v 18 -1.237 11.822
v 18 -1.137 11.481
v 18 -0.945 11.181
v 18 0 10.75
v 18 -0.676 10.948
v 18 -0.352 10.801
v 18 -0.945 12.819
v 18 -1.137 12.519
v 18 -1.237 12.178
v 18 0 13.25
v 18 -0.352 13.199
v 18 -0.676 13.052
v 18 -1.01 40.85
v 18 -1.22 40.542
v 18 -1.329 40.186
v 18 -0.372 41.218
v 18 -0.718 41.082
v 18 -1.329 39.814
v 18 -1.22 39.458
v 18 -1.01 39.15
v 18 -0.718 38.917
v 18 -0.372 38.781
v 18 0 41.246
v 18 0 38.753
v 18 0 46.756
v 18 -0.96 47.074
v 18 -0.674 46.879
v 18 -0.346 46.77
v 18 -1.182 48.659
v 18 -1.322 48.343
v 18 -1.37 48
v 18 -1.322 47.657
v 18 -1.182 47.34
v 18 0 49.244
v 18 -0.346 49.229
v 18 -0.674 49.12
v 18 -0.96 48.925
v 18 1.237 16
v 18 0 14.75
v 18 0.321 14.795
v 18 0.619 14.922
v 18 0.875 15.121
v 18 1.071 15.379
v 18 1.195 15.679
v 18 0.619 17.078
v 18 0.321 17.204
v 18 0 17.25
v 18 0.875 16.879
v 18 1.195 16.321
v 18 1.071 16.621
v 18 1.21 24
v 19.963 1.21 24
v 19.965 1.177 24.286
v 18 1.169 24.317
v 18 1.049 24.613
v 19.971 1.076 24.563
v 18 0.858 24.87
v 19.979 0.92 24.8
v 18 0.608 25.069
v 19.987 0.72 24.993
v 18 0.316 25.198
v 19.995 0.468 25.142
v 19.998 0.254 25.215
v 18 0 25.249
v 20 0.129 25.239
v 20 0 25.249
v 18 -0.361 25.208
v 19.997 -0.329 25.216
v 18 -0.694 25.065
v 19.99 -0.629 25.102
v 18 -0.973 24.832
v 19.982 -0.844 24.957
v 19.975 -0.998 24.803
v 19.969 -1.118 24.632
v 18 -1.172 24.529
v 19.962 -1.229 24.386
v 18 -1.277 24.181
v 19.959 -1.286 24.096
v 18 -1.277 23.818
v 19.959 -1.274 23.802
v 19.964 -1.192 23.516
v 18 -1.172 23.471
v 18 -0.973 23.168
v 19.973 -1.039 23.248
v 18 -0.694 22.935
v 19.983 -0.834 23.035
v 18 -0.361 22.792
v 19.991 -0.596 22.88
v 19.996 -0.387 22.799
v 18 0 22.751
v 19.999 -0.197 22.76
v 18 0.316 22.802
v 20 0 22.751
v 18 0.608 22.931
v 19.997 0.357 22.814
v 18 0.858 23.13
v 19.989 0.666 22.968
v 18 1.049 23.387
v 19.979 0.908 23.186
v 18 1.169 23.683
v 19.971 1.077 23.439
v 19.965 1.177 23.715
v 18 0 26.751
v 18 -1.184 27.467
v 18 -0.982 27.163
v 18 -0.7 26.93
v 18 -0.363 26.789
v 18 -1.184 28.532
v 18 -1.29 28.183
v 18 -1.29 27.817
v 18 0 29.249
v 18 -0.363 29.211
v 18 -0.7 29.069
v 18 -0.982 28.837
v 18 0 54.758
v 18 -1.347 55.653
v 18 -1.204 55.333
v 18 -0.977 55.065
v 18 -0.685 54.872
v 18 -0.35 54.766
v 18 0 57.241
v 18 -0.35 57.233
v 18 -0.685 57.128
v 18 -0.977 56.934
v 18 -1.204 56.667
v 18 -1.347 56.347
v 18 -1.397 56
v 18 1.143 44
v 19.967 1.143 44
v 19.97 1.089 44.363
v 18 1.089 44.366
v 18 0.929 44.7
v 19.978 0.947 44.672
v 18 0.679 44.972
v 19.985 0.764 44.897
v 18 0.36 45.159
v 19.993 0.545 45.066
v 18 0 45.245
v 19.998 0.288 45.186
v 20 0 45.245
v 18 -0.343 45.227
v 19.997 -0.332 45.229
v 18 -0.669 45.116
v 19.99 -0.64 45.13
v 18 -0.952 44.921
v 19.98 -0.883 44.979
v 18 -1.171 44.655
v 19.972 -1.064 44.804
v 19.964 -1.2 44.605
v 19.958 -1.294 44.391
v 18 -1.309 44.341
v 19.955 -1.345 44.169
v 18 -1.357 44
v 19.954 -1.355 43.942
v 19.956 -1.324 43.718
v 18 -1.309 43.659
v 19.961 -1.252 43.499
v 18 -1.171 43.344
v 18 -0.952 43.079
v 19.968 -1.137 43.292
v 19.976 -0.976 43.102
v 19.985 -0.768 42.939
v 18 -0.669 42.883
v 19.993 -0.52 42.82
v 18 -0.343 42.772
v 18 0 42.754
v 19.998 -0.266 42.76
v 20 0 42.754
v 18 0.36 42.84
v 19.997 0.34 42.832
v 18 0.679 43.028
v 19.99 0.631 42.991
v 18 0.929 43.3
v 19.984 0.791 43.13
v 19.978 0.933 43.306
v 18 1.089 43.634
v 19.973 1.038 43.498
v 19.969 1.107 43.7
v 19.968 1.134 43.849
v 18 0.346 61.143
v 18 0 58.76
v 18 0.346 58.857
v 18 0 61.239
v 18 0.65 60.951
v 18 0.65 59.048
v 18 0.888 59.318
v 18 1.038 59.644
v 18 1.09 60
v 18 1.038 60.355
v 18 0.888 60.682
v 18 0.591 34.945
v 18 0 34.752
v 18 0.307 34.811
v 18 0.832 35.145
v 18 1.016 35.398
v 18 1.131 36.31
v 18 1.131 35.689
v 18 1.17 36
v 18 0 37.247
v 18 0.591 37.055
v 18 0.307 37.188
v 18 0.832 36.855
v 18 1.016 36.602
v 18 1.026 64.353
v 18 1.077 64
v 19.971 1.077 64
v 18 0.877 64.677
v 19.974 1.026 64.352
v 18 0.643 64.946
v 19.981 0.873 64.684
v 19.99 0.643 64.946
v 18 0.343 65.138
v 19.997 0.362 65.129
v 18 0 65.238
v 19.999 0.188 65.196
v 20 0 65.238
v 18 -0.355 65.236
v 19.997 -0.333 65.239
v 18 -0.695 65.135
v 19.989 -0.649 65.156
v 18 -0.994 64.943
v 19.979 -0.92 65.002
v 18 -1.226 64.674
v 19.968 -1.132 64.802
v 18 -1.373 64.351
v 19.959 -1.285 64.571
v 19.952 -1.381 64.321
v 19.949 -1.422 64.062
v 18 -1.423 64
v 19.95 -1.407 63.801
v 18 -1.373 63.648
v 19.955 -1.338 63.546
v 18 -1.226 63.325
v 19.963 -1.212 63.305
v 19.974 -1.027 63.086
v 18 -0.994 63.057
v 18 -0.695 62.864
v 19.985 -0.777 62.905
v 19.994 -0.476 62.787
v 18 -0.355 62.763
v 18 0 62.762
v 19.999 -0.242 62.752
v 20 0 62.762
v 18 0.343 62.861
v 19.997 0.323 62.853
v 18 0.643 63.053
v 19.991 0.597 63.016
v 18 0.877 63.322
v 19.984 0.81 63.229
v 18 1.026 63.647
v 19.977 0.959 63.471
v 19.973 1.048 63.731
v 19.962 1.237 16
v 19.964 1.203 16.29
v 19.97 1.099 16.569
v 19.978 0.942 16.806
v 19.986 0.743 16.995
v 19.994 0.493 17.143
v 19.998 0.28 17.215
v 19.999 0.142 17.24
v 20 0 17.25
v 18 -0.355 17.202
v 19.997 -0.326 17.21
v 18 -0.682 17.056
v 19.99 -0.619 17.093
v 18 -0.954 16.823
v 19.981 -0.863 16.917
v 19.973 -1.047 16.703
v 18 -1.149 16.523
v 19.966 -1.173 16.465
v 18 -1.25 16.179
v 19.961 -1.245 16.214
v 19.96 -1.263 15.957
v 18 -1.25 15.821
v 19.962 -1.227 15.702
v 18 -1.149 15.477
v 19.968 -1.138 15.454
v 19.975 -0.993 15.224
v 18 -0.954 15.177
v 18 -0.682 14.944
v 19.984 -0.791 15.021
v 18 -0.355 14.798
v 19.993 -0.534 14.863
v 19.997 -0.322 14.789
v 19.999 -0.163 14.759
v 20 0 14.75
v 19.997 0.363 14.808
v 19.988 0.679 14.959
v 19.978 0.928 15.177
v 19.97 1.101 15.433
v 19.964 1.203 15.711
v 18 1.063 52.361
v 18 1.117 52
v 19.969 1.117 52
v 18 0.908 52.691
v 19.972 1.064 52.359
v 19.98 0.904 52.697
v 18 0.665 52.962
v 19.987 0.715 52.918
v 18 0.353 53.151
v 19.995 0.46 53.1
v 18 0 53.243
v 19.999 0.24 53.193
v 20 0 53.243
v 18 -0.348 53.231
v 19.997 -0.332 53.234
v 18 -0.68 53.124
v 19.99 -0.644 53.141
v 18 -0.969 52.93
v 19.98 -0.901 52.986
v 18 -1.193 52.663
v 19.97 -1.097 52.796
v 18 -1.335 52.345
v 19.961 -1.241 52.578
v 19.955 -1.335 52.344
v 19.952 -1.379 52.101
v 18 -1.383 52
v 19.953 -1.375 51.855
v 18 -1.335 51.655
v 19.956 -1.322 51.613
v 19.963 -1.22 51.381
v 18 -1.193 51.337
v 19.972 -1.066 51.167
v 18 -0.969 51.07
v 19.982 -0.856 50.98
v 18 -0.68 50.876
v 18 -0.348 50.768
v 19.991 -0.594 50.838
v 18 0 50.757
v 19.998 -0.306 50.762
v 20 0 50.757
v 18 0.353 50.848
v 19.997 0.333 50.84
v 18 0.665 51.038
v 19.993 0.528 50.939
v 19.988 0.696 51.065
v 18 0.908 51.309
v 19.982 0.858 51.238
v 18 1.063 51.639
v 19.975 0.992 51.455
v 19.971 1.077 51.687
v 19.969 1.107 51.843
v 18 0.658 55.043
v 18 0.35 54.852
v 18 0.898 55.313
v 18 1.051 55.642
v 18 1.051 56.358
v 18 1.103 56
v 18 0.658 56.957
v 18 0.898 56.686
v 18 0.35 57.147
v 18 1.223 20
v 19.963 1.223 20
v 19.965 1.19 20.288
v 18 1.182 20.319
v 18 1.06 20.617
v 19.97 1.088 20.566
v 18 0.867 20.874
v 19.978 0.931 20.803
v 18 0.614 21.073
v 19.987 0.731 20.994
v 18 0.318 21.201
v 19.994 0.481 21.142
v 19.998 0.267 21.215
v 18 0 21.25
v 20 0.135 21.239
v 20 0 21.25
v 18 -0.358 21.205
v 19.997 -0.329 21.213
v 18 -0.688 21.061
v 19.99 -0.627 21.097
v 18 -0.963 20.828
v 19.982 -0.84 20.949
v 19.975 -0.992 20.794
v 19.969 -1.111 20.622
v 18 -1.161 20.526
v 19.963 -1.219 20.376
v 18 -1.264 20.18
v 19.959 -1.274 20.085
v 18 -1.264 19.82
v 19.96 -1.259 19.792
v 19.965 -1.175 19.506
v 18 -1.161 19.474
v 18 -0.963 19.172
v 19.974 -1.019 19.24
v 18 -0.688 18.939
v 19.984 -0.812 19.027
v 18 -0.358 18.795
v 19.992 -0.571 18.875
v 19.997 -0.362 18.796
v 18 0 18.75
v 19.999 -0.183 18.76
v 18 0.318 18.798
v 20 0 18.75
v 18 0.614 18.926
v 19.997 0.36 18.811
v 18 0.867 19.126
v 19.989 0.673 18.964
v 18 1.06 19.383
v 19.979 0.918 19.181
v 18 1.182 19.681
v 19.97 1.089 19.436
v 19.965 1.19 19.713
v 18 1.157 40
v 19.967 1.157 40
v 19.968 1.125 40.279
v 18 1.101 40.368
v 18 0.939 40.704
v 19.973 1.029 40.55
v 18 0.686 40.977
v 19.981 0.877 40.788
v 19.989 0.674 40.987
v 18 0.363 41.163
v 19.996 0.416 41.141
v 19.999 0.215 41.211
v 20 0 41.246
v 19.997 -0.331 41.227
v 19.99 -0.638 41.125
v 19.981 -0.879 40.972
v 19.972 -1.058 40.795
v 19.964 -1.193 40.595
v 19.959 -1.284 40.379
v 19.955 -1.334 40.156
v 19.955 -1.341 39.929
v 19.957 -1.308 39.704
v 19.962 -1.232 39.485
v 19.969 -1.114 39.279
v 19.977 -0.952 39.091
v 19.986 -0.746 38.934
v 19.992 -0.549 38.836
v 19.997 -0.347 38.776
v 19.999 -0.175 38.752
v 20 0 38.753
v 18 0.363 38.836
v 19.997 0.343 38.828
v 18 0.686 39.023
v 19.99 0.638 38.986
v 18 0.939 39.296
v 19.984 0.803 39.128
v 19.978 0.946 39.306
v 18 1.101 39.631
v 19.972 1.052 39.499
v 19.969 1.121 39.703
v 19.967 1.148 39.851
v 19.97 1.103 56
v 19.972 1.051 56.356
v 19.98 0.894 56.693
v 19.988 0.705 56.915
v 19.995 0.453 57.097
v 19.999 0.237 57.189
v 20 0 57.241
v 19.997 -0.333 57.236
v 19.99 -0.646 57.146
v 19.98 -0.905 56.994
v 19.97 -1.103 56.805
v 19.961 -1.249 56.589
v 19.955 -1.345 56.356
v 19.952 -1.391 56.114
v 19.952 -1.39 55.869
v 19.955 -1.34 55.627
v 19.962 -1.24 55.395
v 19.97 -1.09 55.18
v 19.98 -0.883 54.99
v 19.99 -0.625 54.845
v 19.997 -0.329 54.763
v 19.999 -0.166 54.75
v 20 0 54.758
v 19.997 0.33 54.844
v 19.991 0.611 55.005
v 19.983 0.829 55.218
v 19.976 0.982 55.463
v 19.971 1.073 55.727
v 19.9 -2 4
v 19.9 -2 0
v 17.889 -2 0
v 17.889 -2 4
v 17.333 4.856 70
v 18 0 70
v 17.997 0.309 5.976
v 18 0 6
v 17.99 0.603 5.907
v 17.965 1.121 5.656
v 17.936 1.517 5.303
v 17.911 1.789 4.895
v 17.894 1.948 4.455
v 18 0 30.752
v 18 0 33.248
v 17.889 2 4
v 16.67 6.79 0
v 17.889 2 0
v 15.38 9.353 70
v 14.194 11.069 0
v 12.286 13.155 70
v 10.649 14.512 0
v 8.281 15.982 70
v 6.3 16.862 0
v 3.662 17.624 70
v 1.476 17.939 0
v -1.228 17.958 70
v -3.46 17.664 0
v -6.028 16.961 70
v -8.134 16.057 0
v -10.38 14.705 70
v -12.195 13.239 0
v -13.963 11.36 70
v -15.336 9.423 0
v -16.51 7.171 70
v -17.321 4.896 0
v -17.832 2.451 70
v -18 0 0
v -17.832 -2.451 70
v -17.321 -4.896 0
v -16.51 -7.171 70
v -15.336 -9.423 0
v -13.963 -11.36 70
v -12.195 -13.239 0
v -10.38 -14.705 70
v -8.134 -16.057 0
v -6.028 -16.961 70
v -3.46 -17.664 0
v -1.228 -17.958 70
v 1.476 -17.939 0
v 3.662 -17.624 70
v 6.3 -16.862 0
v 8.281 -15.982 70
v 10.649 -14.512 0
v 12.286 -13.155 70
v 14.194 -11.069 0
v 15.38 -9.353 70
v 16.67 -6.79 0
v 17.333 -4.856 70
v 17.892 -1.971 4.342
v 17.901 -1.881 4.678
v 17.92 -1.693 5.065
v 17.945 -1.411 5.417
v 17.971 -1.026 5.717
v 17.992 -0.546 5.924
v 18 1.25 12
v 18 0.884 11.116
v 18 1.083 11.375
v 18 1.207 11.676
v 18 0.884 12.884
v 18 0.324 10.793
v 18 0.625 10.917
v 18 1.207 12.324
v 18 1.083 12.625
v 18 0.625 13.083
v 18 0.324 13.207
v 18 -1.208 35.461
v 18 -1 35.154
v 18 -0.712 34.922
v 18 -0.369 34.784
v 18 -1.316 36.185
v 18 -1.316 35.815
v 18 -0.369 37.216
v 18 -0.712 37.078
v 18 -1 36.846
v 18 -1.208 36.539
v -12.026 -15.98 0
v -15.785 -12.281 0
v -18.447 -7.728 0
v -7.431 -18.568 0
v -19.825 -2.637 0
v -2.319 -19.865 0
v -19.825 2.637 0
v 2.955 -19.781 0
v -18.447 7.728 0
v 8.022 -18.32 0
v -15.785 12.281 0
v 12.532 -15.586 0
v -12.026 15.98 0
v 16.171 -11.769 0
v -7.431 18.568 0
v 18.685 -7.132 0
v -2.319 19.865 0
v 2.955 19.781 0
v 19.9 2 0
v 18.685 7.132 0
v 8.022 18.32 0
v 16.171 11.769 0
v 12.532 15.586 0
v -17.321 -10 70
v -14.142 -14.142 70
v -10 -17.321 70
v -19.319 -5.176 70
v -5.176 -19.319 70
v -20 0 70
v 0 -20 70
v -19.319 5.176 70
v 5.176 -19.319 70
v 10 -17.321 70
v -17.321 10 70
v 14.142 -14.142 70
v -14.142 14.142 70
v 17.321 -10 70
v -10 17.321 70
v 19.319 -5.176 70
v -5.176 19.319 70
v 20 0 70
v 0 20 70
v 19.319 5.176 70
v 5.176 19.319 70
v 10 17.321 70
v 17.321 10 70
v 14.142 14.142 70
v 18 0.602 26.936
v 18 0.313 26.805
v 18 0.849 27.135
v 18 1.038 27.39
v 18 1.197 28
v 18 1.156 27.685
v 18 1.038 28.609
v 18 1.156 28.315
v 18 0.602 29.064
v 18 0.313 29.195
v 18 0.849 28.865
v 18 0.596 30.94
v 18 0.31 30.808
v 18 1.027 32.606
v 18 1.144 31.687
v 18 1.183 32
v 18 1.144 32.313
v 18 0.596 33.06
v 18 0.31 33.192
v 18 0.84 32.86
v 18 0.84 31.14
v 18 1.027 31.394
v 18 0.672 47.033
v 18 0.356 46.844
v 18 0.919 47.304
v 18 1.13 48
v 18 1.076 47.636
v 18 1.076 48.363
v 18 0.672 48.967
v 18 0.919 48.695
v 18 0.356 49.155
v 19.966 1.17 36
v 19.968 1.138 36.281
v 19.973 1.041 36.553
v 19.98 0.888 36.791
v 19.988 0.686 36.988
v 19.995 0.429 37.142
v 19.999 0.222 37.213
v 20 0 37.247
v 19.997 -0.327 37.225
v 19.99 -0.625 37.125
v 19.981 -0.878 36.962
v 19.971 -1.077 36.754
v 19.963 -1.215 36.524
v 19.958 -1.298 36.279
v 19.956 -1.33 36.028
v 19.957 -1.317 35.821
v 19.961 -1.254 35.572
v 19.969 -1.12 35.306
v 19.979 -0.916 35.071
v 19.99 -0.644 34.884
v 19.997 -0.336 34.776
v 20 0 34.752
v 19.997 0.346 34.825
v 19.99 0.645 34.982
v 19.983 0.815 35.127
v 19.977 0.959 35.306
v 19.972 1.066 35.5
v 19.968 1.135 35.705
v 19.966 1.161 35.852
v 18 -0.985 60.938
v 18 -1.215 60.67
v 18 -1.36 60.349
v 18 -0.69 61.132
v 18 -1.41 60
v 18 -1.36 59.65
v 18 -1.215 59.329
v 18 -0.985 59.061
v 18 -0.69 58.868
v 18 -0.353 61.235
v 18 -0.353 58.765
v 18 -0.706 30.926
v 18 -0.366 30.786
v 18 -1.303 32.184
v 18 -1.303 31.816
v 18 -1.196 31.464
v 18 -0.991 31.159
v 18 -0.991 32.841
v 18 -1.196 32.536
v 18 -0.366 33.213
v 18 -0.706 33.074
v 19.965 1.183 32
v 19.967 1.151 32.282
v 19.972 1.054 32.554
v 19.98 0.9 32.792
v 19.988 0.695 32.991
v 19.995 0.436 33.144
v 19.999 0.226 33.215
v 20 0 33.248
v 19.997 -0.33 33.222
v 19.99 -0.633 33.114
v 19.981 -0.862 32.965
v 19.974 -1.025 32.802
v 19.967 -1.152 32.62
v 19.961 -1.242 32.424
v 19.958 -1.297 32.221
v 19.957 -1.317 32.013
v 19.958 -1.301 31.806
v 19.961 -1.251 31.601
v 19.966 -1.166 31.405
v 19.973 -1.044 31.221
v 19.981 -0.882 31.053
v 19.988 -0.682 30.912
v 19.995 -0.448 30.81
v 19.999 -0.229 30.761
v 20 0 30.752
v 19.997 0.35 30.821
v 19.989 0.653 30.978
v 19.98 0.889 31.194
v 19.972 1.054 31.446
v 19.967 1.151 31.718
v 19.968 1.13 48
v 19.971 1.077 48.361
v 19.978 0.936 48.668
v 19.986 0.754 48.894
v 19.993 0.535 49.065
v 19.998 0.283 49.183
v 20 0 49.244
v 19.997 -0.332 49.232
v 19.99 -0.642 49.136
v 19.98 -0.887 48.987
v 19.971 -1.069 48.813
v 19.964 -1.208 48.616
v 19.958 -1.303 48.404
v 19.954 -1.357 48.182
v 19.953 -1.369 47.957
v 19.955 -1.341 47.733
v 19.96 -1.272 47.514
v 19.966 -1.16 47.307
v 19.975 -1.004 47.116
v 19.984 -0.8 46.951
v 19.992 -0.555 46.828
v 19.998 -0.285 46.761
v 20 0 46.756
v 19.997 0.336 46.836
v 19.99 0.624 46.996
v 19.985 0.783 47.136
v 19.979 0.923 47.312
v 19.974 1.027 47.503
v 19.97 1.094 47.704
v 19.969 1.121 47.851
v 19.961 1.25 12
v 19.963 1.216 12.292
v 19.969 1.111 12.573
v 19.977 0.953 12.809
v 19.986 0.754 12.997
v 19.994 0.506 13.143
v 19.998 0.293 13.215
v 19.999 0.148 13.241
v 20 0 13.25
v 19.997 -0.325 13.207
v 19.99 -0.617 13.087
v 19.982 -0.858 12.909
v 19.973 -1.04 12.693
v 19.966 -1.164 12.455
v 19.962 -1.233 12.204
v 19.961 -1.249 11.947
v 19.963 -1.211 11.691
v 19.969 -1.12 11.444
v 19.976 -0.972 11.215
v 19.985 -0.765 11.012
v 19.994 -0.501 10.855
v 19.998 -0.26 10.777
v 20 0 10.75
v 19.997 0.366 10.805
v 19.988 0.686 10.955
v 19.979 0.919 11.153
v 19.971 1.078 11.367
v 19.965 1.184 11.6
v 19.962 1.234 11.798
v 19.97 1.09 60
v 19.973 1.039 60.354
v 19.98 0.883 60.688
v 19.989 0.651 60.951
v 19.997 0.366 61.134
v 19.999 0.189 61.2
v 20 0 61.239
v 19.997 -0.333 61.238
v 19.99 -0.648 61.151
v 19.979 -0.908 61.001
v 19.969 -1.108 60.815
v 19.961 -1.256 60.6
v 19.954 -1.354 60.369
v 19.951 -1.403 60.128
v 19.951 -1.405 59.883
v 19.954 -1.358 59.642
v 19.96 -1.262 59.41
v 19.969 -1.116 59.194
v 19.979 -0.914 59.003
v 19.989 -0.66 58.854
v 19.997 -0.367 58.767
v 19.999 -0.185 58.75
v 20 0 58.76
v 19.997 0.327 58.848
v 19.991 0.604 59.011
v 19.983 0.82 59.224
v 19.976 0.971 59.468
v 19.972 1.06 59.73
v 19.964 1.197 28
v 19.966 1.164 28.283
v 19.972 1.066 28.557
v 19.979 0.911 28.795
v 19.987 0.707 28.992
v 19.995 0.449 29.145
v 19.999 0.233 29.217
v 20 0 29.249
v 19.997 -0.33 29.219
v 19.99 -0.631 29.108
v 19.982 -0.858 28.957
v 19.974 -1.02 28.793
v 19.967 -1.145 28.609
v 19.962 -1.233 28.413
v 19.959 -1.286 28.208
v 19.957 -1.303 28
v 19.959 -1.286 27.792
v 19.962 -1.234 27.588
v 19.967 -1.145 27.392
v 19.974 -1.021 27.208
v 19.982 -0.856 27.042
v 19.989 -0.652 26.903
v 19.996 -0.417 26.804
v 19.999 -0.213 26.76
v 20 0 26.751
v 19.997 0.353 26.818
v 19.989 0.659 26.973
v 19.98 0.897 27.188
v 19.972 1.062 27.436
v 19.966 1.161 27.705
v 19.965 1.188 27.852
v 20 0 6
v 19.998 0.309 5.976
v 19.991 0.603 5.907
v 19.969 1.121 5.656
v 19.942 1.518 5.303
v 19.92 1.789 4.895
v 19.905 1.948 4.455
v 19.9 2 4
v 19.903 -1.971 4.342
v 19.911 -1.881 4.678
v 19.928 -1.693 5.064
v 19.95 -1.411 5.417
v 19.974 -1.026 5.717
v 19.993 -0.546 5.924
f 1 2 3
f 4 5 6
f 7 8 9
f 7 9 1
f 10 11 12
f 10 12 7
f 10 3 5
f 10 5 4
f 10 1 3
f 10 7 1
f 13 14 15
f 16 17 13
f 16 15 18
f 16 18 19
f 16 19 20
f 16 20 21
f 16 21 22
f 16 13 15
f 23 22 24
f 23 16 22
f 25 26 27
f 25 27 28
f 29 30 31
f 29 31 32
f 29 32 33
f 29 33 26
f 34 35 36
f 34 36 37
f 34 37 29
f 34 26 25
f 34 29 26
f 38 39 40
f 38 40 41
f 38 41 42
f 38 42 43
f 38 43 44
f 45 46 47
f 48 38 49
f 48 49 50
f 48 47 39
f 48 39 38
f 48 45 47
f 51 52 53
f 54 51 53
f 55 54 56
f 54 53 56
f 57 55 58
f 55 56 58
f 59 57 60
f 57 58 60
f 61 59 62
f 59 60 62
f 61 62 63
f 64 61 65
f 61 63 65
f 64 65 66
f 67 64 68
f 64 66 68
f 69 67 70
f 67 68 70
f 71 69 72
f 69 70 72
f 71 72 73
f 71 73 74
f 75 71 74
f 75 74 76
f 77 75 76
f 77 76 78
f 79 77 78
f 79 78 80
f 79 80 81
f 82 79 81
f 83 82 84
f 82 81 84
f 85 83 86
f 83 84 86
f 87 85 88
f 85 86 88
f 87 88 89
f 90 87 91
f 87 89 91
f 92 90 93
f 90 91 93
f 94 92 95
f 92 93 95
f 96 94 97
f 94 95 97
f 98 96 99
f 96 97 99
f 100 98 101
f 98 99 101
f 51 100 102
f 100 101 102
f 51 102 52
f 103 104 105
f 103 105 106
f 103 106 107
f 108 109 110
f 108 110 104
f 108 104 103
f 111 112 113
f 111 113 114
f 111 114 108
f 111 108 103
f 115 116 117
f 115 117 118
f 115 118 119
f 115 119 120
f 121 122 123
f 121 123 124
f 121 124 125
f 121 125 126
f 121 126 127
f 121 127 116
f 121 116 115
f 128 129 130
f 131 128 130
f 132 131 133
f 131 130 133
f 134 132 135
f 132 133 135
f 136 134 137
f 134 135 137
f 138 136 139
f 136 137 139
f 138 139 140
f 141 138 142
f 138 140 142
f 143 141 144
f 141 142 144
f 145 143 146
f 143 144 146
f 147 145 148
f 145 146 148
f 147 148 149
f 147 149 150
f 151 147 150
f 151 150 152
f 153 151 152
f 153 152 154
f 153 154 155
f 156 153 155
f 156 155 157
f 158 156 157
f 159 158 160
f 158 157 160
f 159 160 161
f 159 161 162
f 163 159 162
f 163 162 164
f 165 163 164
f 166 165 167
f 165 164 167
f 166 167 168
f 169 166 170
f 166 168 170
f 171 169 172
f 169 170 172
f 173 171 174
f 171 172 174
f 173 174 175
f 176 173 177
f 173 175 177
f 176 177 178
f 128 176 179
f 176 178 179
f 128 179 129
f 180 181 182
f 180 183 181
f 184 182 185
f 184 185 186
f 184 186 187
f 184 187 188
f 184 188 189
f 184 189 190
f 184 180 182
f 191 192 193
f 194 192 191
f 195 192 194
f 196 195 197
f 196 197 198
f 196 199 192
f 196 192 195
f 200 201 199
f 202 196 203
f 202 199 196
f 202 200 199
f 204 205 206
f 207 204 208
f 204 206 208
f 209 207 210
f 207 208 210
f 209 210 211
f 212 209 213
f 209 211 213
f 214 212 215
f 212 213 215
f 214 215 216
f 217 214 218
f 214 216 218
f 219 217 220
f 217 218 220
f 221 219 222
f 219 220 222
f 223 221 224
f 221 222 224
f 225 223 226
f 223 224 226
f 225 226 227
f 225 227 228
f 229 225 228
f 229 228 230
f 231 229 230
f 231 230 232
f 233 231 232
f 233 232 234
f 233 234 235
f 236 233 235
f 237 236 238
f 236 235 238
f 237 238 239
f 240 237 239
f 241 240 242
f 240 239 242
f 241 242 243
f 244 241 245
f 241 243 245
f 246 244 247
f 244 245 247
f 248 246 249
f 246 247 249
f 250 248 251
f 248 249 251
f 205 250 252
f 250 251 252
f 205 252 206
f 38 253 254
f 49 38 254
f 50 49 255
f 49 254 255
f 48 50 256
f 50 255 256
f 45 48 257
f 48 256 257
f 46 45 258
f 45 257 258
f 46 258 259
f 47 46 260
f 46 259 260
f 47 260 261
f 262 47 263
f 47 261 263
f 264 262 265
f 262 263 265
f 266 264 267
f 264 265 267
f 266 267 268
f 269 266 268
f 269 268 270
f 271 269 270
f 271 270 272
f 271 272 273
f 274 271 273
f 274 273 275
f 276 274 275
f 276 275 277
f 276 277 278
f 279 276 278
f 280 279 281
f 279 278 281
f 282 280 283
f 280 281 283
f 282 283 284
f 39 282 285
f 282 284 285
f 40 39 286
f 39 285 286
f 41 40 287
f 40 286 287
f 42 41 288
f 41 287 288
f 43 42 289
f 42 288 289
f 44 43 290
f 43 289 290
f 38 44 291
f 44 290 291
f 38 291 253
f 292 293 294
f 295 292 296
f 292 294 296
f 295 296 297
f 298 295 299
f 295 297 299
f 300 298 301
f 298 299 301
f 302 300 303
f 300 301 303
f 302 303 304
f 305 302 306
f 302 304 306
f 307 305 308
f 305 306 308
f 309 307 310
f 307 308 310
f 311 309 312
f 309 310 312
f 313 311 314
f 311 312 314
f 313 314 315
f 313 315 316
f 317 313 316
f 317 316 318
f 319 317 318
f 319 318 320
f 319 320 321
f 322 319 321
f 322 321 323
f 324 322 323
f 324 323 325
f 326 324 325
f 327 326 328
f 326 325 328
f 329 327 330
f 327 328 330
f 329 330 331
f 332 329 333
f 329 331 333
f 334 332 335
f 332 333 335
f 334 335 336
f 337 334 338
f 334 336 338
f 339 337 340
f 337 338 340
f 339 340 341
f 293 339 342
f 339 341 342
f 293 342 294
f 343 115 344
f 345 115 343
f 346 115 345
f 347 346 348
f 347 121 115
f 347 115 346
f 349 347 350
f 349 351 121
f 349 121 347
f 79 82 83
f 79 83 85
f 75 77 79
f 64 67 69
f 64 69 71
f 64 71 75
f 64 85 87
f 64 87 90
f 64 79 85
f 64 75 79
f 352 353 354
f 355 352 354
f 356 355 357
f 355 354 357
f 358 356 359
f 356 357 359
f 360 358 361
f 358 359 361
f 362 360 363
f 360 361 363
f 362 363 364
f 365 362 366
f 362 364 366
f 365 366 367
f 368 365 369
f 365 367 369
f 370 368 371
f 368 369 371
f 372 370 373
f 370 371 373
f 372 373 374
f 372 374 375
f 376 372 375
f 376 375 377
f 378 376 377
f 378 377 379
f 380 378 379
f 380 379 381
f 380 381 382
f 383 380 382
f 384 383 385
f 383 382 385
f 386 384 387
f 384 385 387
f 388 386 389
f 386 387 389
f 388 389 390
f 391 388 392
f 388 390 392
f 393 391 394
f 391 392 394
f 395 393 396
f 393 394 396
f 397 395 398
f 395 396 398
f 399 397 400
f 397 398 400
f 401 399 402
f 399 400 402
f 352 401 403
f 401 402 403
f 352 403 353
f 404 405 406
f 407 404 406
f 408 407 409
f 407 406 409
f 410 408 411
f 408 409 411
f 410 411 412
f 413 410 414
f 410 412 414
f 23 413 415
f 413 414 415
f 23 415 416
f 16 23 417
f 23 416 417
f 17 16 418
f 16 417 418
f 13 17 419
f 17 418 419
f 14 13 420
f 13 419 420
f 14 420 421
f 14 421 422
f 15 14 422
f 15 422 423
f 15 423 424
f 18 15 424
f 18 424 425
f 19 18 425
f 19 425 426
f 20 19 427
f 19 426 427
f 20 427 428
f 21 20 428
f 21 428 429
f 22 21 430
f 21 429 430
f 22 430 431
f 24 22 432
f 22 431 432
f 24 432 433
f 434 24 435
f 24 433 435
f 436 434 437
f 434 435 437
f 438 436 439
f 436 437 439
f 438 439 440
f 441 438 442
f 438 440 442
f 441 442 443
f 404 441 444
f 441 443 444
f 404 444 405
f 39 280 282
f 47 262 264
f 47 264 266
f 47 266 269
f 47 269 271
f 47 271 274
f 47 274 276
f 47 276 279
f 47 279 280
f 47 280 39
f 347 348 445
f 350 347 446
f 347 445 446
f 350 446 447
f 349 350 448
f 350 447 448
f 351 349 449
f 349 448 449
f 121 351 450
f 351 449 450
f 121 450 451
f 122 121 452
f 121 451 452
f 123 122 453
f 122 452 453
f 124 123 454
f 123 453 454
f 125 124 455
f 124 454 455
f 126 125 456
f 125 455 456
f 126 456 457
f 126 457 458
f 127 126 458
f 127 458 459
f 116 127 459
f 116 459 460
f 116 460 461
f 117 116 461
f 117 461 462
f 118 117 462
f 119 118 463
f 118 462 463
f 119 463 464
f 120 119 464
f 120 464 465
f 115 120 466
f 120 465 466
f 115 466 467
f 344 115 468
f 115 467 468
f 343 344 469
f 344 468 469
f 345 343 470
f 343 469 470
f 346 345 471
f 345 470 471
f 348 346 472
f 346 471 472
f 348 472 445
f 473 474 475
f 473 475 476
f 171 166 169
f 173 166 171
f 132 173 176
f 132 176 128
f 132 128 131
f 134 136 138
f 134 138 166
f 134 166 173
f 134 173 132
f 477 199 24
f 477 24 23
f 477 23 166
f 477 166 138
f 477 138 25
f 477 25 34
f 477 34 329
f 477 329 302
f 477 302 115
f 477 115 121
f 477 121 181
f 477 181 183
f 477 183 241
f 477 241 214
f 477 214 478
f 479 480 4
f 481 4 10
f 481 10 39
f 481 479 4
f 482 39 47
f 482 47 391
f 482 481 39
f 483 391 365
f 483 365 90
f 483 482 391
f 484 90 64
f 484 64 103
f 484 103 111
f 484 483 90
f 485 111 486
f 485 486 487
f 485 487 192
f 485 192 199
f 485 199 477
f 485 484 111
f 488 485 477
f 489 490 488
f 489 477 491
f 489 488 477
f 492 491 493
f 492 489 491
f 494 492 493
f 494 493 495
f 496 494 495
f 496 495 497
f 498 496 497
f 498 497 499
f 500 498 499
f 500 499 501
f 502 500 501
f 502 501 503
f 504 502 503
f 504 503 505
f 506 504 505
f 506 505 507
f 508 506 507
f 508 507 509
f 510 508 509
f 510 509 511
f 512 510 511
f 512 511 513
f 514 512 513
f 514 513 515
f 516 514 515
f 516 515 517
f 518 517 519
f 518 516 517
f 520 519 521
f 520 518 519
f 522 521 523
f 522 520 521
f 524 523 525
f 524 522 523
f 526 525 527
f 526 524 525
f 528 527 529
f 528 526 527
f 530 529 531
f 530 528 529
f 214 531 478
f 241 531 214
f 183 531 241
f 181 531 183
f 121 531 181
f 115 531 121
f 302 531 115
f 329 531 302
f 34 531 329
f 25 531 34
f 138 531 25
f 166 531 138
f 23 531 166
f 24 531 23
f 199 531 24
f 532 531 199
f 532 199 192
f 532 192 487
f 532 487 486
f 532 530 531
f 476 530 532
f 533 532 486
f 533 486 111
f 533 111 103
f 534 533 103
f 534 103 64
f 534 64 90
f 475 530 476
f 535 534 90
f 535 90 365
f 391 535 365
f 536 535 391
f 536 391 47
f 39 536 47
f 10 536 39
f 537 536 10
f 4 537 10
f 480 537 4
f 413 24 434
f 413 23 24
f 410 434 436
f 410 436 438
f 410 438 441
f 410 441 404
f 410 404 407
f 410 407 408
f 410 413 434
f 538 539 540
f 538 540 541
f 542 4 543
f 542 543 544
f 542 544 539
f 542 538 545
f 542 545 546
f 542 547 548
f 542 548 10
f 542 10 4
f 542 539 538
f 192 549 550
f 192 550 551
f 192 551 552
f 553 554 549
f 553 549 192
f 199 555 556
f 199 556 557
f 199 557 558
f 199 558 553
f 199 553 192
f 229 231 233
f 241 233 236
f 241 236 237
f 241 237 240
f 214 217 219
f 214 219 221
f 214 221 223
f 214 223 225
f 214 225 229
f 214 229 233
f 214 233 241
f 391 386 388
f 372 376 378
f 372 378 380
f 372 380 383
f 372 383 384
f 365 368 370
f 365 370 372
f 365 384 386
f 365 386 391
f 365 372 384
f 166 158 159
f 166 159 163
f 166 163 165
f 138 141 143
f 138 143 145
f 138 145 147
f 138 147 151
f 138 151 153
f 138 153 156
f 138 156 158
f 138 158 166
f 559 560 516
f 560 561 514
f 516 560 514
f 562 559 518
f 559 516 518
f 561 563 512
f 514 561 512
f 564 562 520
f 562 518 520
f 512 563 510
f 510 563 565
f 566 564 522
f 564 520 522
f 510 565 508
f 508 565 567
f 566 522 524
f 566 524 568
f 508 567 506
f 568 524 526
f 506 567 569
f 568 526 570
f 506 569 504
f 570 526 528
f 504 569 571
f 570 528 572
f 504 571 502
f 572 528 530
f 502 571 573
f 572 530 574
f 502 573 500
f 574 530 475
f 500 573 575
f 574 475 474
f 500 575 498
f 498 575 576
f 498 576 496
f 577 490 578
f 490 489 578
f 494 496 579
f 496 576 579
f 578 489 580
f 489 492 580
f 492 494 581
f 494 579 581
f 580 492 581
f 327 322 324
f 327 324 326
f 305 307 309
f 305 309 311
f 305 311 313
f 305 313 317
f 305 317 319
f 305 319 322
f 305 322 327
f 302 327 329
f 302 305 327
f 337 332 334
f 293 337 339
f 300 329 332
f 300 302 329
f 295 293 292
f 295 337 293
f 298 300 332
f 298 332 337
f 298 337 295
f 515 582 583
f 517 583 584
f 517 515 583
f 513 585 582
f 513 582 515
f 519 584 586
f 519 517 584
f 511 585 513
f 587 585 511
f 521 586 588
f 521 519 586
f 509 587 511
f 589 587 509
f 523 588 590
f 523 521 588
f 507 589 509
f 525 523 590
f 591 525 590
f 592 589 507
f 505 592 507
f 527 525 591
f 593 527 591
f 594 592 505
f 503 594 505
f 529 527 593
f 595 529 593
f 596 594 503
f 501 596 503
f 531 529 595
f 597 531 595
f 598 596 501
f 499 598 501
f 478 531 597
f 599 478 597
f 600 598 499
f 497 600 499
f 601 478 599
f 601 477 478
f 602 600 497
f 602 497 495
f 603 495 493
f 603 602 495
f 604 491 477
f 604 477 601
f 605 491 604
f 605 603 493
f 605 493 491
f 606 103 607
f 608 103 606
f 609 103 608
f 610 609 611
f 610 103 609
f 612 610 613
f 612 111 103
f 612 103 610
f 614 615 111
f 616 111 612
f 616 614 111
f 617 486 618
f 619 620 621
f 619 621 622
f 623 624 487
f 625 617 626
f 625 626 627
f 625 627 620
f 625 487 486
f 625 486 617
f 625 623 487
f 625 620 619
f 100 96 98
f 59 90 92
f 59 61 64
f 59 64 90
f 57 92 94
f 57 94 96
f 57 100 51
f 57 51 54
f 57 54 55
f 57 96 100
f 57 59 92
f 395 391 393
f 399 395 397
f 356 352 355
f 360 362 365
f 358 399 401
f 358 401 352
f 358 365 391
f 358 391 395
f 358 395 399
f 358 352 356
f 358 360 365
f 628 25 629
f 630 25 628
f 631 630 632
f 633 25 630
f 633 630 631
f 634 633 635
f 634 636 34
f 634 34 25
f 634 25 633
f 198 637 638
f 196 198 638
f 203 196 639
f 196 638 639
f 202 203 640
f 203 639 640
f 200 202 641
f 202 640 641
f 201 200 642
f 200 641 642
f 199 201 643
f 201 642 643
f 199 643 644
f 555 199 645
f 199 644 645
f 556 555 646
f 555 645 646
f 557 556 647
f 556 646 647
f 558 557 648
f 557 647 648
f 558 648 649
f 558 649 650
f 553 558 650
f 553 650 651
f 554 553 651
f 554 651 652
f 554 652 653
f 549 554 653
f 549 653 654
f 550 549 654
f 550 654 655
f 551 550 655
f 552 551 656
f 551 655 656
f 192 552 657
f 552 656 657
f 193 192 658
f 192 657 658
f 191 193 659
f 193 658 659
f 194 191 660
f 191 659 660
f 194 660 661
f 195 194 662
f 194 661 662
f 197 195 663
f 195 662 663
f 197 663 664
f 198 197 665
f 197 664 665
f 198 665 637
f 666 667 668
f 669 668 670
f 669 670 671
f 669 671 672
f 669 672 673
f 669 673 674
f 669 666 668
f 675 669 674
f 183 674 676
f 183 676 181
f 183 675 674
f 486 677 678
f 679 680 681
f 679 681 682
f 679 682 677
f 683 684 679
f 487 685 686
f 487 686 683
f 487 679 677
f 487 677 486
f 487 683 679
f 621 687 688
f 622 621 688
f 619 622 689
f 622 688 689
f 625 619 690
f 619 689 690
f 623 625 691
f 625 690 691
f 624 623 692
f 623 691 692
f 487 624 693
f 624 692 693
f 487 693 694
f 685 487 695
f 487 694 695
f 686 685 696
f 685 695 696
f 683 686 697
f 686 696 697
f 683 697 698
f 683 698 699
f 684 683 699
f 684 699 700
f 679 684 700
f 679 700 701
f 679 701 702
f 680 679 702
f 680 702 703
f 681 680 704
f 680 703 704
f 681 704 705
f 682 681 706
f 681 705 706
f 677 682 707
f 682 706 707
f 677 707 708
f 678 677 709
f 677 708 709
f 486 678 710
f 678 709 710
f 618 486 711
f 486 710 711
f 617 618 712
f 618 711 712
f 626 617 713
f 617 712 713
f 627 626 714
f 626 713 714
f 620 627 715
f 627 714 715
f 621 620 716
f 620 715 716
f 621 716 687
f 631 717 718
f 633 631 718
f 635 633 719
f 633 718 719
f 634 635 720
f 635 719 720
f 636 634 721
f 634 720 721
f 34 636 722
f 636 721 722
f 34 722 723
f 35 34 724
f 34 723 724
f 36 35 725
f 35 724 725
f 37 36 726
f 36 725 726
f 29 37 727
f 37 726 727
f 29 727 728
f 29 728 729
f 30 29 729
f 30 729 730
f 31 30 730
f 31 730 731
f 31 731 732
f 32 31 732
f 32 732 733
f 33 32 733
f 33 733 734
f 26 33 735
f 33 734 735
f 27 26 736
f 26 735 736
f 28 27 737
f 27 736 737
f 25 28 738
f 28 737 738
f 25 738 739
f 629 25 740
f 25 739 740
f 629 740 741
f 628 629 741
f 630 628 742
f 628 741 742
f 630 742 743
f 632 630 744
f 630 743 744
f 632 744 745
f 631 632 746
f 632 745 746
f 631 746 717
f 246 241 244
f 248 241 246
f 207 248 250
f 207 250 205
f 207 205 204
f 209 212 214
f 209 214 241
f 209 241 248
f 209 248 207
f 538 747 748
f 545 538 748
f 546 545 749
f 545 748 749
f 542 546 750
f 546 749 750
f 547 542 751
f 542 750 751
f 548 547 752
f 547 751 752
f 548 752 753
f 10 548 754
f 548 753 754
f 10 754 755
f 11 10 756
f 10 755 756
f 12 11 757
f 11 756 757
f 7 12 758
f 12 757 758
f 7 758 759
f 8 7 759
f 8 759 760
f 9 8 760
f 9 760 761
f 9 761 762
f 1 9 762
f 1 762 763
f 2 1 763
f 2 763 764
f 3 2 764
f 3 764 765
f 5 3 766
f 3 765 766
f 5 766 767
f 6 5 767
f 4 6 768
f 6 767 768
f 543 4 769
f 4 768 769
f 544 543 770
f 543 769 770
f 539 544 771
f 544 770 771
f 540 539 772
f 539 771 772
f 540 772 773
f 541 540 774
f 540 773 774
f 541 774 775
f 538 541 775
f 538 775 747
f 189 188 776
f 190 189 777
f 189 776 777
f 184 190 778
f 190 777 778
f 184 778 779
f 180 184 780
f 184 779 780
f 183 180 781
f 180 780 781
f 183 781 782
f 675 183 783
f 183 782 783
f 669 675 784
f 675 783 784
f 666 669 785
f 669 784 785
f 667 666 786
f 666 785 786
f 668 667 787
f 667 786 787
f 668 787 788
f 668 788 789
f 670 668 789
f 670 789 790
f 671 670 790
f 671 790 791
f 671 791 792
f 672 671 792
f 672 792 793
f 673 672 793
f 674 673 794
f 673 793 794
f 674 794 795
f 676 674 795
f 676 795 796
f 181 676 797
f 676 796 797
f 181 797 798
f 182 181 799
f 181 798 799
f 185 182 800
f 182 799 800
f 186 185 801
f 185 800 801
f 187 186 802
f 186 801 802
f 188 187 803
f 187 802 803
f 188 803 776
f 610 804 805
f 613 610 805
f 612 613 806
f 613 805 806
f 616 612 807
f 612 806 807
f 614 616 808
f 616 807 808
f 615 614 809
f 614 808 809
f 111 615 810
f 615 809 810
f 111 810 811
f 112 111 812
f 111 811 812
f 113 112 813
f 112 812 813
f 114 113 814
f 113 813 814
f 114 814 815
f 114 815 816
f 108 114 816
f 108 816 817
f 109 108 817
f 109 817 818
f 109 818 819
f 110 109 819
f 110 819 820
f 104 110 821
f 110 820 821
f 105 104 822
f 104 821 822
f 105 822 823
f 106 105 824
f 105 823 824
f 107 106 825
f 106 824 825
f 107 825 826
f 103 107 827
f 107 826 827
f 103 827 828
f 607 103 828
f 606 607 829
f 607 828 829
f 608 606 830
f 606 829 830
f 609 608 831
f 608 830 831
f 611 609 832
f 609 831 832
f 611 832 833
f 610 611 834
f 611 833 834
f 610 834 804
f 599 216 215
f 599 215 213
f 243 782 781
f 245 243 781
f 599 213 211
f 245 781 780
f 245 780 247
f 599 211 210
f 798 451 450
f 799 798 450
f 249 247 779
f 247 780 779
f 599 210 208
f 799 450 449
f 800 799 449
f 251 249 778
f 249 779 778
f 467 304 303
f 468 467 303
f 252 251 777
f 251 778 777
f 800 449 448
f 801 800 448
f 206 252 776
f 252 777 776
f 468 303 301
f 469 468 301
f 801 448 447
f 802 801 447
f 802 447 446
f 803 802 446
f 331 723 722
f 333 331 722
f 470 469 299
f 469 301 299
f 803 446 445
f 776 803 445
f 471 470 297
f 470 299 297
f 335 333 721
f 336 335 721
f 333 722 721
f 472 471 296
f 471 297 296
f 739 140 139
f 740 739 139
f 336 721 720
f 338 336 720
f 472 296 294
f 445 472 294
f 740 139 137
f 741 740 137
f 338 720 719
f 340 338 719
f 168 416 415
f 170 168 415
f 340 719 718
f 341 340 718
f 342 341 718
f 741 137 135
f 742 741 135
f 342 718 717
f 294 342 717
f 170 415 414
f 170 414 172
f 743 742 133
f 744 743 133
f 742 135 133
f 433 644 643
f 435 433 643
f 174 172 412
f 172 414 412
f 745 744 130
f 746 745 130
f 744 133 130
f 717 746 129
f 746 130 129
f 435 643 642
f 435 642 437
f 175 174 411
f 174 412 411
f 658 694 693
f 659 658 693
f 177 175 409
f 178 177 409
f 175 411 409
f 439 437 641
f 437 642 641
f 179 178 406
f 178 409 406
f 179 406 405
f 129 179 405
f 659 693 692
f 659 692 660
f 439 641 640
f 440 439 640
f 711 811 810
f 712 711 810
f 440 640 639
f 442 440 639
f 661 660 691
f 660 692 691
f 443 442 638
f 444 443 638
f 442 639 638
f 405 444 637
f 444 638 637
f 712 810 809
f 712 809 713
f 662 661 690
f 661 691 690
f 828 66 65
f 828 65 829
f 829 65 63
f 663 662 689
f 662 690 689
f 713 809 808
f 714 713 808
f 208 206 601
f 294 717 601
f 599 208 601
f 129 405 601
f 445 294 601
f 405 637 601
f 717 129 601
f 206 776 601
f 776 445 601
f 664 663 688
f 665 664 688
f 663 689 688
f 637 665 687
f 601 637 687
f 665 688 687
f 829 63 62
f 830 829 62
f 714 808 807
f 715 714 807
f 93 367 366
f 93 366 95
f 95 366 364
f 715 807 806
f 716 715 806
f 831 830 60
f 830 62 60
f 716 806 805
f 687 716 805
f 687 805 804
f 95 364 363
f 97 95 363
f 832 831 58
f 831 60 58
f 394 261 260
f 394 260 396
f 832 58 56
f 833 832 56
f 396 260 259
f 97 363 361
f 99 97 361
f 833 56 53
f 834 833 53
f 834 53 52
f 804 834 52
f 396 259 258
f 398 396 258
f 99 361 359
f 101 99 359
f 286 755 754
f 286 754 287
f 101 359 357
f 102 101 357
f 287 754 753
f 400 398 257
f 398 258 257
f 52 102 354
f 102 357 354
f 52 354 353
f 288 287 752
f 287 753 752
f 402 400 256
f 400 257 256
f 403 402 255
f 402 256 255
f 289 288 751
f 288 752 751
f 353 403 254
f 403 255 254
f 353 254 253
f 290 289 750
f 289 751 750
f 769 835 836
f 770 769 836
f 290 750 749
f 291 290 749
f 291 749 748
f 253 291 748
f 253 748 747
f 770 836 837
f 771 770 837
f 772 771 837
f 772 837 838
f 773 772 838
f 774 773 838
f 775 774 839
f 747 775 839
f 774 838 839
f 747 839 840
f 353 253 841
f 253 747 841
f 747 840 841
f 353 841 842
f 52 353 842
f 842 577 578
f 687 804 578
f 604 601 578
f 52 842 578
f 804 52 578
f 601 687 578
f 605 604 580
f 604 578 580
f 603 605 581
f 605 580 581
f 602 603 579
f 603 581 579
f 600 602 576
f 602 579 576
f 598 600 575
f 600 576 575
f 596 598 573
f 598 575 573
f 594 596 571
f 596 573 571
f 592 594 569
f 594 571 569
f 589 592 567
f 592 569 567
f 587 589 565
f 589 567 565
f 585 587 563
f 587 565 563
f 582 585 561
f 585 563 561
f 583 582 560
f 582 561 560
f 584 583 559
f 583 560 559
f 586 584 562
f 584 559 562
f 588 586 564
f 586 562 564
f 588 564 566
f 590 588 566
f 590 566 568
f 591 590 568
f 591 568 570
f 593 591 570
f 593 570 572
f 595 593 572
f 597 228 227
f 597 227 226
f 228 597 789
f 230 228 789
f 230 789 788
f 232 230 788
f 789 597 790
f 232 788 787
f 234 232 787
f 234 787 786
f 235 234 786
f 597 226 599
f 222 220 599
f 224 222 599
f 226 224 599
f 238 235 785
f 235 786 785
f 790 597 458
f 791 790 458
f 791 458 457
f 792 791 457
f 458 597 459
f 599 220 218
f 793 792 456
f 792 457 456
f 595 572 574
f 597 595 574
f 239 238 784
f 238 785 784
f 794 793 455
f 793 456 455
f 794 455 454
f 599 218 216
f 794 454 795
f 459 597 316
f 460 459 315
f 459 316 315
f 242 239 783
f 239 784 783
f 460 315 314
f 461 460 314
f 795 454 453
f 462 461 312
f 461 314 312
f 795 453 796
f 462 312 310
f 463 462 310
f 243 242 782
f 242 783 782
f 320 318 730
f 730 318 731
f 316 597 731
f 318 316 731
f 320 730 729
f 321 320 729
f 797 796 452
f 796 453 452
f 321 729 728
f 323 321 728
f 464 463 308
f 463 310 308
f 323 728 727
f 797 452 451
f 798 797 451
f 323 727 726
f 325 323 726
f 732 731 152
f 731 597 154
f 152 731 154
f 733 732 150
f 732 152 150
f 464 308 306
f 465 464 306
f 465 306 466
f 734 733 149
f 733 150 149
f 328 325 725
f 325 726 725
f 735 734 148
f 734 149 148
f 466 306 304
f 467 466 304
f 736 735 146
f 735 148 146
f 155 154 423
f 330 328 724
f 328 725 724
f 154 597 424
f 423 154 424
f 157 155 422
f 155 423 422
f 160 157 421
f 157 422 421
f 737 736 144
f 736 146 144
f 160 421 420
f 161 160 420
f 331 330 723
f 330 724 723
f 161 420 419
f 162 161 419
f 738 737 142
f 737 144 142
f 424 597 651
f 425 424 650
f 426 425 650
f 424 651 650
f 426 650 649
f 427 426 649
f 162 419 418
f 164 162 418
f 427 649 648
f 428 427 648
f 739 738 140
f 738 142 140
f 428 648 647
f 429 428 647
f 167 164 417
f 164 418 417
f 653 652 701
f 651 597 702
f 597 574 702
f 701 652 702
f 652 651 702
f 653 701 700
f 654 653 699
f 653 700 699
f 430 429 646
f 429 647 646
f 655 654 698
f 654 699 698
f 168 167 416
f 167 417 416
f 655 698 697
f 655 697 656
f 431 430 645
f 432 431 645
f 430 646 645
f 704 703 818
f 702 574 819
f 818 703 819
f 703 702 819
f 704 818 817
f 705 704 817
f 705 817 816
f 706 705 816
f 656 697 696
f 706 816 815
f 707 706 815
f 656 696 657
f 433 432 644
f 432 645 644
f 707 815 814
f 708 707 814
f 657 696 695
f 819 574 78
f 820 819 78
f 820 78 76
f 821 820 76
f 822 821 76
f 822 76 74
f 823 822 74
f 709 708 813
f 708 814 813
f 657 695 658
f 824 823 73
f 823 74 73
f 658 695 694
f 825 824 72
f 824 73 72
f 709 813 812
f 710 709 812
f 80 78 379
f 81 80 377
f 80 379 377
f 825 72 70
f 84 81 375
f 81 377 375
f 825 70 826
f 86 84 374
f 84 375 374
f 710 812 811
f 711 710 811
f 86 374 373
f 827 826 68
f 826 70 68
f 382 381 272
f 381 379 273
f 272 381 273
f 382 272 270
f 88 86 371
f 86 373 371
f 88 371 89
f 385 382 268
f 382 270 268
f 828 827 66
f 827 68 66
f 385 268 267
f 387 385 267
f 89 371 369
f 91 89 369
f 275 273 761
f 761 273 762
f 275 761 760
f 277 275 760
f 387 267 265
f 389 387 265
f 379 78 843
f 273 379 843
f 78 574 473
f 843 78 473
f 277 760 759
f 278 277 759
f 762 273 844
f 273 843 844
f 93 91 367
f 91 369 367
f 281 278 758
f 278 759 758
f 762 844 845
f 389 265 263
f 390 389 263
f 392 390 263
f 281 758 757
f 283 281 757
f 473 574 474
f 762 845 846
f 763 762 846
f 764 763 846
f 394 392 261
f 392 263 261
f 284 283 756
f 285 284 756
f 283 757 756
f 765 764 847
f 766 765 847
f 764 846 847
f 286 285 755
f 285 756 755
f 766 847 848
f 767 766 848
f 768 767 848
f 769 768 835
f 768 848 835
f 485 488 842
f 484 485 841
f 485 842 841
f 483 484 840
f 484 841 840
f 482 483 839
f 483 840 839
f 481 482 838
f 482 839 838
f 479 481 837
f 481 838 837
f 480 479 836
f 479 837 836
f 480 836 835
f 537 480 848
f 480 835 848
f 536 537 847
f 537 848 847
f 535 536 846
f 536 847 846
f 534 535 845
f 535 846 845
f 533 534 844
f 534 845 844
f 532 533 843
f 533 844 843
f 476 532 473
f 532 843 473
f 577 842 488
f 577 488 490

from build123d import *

# Parameters (mm, degrees)
SKETCH006_R      = 1.25
EXTRUDE008_DEPTH = 2
EXTRUDE005_DEPTH = 20
SKETCH_R         = 20
SKETCH_R_2       = 18
EXTRUDE_DEPTH    = 70


with BuildPart() as extrude008:
    # Sketch006 → Extrude008 (new body)
    with BuildSketch(Plane(origin=(20, 0, 12), x_dir=(0, 1, 0), z_dir=(1, 0, 0))):
        Circle(SKETCH006_R)
        with Locations((-0.013333, 3.999978)):
            Circle(SKETCH006_R)
        with Locations((-0.026665, 7.999956)):
            Circle(SKETCH006_R)
        with Locations((-0.039998, 11.999933)):
            Circle(SKETCH006_R)
        with Locations((-0.053331, 15.999911)):
            Circle(SKETCH006_R)
        with Locations((-0.066663, 19.999889)):
            Circle(SKETCH006_R)
        with Locations((-0.079996, 23.999867)):
            Circle(SKETCH006_R)
        with Locations((-0.093328, 27.999844)):
            Circle(SKETCH006_R)
        with Locations((-0.106661, 31.999822)):
            Circle(SKETCH006_R)
        with Locations((-0.119994, 35.9998)):
            Circle(SKETCH006_R)
        with Locations((-0.133326, 39.999778)):
            Circle(SKETCH006_R)
        with Locations((-0.146659, 43.999756)):
            Circle(SKETCH006_R)
        with Locations((-0.159992, 47.999733)):
            Circle(SKETCH006_R)
        with Locations((-0.173324, 51.999711)):
            Circle(SKETCH006_R)
    extrude(amount=-EXTRUDE008_DEPTH)


with BuildPart() as extrude005:
    # Sketch004 → Extrude005 (new body, symmetric)
    with BuildSketch(Plane.YZ):
        with BuildLine():
            Line((2, 4), (2, 0))
            Line((2, 0), (-2, 0))
            Line((-2, 0), (-2, 4))
            ThreePointArc((2, 4), (0, 6), (-2, 4))
        make_face()
    extrude(amount=EXTRUDE005_DEPTH, both=True)


with BuildPart() as extrude005_1:
    # Extrude005 placement: moved
    add(extrude005.part.moved(Location((10, 0, 0))))


with BuildPart() as cut001:
    # Sketch → Extrude (new body)
    with BuildSketch(Plane.XY):
        Circle(SKETCH_R)
        Circle(SKETCH_R_2, mode=Mode.SUBTRACT)
    extrude(amount=EXTRUDE_DEPTH)

    # Cut: cut Extrude005
    add(extrude005_1.part, mode=Mode.SUBTRACT)

    # Cut001: cut Extrude008
    add(extrude008.part, mode=Mode.SUBTRACT)


solid = cut001.part
